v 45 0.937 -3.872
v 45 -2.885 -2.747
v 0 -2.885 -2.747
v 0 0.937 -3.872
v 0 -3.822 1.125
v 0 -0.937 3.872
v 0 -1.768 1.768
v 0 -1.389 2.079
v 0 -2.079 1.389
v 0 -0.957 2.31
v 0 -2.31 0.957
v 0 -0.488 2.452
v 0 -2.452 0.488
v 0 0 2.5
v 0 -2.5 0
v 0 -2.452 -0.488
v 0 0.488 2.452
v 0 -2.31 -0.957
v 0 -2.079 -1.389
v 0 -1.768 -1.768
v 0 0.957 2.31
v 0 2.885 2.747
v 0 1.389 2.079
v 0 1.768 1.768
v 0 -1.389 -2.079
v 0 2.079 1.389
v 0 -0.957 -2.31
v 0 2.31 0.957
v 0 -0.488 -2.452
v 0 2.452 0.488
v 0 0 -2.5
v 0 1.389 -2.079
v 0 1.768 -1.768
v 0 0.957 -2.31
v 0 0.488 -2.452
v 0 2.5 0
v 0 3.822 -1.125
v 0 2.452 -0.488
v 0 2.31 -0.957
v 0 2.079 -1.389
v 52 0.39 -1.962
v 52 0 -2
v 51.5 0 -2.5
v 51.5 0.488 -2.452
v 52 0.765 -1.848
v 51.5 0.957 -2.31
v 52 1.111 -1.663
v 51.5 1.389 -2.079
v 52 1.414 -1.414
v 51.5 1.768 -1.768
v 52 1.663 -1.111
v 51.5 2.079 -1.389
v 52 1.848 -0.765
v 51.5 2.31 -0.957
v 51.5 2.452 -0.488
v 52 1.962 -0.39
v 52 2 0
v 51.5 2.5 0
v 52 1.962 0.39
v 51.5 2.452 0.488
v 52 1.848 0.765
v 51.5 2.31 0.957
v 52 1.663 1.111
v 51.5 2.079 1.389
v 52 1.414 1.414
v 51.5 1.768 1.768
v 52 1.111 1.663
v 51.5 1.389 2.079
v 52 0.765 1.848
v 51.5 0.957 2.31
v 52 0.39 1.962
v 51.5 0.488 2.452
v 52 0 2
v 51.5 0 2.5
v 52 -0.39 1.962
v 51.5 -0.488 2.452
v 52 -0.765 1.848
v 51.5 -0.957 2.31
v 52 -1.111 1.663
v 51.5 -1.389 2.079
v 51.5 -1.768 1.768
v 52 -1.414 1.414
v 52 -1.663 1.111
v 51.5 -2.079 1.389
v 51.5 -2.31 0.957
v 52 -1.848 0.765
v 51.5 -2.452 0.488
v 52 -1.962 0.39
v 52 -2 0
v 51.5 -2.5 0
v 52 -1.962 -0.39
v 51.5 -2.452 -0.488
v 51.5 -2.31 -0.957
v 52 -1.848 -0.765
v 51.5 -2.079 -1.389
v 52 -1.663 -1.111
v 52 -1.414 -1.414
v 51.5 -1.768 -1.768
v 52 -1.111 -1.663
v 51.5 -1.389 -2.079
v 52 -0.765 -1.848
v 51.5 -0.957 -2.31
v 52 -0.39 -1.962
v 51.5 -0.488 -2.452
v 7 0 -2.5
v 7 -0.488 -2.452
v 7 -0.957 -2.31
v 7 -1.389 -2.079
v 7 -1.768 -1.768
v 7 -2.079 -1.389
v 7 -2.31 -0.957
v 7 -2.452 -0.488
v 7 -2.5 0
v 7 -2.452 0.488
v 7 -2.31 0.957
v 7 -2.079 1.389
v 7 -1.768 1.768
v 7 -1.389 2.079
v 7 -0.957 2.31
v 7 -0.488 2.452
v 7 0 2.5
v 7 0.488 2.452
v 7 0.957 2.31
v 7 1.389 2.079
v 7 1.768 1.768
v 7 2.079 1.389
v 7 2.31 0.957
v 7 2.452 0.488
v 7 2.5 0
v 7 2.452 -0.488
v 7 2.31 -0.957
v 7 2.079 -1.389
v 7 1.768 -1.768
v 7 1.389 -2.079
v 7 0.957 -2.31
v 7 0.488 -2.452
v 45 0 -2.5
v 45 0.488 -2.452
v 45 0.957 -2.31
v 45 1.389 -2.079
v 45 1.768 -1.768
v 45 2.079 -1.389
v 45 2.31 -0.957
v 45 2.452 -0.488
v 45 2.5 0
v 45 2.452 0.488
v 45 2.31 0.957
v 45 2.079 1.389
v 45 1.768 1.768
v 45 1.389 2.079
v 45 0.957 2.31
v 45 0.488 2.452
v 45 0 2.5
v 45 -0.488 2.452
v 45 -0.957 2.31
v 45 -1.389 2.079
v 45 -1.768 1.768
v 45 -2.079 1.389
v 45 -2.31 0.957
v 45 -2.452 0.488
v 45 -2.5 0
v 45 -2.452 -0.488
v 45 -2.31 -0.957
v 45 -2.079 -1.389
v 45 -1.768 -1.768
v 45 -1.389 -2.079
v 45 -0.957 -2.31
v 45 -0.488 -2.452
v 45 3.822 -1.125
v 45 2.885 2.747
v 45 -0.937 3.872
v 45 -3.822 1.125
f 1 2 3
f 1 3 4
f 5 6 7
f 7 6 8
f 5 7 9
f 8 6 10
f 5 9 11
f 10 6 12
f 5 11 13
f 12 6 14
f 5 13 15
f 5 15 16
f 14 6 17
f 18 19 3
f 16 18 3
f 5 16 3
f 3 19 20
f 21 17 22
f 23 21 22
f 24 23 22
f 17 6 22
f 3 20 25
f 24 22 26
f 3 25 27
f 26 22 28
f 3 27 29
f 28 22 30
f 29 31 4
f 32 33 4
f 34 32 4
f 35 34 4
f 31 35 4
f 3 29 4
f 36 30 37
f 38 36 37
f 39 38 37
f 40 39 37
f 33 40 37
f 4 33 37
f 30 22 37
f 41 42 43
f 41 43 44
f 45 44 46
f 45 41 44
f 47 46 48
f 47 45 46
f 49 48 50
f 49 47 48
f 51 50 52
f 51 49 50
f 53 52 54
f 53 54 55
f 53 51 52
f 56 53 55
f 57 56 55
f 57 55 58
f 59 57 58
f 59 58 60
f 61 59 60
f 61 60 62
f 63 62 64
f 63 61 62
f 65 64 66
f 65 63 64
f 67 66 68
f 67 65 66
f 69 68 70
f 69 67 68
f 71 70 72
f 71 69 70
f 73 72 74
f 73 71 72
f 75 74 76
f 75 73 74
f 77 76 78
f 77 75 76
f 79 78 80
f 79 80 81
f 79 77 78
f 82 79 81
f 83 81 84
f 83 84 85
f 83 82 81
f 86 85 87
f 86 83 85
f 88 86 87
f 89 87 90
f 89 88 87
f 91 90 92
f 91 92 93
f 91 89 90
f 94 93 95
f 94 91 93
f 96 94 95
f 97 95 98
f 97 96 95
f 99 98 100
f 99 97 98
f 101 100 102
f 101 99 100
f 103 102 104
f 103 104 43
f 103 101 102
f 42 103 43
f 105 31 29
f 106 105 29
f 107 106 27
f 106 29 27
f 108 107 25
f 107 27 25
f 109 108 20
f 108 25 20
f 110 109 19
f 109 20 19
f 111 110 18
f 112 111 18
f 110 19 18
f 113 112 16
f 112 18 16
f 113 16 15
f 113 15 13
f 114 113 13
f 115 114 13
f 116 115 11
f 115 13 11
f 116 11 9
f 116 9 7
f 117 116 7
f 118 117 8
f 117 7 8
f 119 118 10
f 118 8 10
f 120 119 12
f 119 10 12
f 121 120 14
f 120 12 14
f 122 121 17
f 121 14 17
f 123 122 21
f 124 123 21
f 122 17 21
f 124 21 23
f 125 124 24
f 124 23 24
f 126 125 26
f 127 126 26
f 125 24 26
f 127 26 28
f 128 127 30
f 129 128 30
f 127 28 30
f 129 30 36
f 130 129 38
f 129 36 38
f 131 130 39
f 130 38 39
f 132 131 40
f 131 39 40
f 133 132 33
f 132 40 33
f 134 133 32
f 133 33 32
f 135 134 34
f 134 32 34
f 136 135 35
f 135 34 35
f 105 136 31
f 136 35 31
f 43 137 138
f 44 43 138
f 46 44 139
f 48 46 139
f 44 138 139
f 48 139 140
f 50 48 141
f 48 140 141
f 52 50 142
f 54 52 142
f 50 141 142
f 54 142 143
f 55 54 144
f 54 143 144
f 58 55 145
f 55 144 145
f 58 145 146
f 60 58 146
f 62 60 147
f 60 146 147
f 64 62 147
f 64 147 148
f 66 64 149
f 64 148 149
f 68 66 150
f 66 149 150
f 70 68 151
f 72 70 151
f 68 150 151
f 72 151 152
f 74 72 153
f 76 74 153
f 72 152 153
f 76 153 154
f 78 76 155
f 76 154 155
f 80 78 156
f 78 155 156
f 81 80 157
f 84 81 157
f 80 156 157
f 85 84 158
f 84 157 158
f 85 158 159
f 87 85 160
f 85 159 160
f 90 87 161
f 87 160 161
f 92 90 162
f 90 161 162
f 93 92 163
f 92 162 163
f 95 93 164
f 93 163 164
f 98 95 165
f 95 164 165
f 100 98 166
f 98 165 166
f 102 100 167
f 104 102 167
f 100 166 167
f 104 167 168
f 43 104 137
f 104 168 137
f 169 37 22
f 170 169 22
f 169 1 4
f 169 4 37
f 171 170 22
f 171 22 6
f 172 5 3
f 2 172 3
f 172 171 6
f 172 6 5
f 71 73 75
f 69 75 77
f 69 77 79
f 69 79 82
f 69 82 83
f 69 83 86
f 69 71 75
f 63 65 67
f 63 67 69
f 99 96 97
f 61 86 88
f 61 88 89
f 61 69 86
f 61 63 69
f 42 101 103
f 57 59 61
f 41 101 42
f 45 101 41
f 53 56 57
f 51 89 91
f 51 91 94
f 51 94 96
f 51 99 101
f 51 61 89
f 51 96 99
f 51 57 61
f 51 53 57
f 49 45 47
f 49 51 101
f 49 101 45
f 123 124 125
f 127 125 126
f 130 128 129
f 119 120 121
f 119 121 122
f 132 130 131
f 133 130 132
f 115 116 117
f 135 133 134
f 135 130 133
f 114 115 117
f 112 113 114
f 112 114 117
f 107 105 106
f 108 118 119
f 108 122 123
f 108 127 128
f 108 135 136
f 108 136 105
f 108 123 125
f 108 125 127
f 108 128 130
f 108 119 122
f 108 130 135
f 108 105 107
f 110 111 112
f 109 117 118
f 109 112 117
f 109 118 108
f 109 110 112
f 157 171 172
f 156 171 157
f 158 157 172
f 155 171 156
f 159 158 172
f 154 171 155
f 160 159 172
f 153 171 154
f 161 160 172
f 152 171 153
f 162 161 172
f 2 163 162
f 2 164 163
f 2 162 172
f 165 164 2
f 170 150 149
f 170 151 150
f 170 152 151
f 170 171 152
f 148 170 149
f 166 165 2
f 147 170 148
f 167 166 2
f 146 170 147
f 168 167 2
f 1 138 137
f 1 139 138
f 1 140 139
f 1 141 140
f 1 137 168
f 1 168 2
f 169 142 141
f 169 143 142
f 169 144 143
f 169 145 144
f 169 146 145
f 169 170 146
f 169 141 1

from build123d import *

# Parameters (mm, degrees)
EXTRUDE_1_DEPTH     = 45
SKETCH_2_R          = 2.5
EXTRUDE_2_DEPTH     = 7
CHAMFER_1_SIZE      = 0.5
SKETCH_3_R          = 2.5
CUT_EXTRUDE_1_DEPTH = 7


with BuildPart() as part:
    # 草图1 → 凸台-拉伸1 (new body)
    with BuildSketch(Plane(origin=(0, 0, 0), x_dir=(0, 0, -1), z_dir=(1, 0, 0))):
        Polygon((2.747304238, -2.88484305), (3.871999486, 0.936813737), (1.124695248, 3.821656787), (-2.747304238, 2.88484305), (-3.871999486, -0.936813737), (-1.124695248, -3.821656787), align=None)
    extrude(amount=EXTRUDE_1_DEPTH)

    # 草图2 → 凸台-拉伸2 (add)
    with BuildSketch(Plane(origin=(45, 0, 0), x_dir=(0, 0, -1), z_dir=(1, 0, 0))):
        Circle(SKETCH_2_R)
    extrude(amount=EXTRUDE_2_DEPTH)

    # 倒角1
    chamfer_1_edges = [part.edges().sort_by_distance(p)[0] for p in [
        (52, 0, 2.5),
    ]]
    chamfer(chamfer_1_edges, length=CHAMFER_1_SIZE)

    # 草图3 → 切除-拉伸1 (cut)
    with BuildSketch(Plane.ZY):
        with Locations(Location((0, 0, 0), (0, 0, 180))):
            Circle(SKETCH_3_R)
    extrude(amount=-CUT_EXTRUDE_1_DEPTH, mode=Mode.SUBTRACT)


solid = part.part
